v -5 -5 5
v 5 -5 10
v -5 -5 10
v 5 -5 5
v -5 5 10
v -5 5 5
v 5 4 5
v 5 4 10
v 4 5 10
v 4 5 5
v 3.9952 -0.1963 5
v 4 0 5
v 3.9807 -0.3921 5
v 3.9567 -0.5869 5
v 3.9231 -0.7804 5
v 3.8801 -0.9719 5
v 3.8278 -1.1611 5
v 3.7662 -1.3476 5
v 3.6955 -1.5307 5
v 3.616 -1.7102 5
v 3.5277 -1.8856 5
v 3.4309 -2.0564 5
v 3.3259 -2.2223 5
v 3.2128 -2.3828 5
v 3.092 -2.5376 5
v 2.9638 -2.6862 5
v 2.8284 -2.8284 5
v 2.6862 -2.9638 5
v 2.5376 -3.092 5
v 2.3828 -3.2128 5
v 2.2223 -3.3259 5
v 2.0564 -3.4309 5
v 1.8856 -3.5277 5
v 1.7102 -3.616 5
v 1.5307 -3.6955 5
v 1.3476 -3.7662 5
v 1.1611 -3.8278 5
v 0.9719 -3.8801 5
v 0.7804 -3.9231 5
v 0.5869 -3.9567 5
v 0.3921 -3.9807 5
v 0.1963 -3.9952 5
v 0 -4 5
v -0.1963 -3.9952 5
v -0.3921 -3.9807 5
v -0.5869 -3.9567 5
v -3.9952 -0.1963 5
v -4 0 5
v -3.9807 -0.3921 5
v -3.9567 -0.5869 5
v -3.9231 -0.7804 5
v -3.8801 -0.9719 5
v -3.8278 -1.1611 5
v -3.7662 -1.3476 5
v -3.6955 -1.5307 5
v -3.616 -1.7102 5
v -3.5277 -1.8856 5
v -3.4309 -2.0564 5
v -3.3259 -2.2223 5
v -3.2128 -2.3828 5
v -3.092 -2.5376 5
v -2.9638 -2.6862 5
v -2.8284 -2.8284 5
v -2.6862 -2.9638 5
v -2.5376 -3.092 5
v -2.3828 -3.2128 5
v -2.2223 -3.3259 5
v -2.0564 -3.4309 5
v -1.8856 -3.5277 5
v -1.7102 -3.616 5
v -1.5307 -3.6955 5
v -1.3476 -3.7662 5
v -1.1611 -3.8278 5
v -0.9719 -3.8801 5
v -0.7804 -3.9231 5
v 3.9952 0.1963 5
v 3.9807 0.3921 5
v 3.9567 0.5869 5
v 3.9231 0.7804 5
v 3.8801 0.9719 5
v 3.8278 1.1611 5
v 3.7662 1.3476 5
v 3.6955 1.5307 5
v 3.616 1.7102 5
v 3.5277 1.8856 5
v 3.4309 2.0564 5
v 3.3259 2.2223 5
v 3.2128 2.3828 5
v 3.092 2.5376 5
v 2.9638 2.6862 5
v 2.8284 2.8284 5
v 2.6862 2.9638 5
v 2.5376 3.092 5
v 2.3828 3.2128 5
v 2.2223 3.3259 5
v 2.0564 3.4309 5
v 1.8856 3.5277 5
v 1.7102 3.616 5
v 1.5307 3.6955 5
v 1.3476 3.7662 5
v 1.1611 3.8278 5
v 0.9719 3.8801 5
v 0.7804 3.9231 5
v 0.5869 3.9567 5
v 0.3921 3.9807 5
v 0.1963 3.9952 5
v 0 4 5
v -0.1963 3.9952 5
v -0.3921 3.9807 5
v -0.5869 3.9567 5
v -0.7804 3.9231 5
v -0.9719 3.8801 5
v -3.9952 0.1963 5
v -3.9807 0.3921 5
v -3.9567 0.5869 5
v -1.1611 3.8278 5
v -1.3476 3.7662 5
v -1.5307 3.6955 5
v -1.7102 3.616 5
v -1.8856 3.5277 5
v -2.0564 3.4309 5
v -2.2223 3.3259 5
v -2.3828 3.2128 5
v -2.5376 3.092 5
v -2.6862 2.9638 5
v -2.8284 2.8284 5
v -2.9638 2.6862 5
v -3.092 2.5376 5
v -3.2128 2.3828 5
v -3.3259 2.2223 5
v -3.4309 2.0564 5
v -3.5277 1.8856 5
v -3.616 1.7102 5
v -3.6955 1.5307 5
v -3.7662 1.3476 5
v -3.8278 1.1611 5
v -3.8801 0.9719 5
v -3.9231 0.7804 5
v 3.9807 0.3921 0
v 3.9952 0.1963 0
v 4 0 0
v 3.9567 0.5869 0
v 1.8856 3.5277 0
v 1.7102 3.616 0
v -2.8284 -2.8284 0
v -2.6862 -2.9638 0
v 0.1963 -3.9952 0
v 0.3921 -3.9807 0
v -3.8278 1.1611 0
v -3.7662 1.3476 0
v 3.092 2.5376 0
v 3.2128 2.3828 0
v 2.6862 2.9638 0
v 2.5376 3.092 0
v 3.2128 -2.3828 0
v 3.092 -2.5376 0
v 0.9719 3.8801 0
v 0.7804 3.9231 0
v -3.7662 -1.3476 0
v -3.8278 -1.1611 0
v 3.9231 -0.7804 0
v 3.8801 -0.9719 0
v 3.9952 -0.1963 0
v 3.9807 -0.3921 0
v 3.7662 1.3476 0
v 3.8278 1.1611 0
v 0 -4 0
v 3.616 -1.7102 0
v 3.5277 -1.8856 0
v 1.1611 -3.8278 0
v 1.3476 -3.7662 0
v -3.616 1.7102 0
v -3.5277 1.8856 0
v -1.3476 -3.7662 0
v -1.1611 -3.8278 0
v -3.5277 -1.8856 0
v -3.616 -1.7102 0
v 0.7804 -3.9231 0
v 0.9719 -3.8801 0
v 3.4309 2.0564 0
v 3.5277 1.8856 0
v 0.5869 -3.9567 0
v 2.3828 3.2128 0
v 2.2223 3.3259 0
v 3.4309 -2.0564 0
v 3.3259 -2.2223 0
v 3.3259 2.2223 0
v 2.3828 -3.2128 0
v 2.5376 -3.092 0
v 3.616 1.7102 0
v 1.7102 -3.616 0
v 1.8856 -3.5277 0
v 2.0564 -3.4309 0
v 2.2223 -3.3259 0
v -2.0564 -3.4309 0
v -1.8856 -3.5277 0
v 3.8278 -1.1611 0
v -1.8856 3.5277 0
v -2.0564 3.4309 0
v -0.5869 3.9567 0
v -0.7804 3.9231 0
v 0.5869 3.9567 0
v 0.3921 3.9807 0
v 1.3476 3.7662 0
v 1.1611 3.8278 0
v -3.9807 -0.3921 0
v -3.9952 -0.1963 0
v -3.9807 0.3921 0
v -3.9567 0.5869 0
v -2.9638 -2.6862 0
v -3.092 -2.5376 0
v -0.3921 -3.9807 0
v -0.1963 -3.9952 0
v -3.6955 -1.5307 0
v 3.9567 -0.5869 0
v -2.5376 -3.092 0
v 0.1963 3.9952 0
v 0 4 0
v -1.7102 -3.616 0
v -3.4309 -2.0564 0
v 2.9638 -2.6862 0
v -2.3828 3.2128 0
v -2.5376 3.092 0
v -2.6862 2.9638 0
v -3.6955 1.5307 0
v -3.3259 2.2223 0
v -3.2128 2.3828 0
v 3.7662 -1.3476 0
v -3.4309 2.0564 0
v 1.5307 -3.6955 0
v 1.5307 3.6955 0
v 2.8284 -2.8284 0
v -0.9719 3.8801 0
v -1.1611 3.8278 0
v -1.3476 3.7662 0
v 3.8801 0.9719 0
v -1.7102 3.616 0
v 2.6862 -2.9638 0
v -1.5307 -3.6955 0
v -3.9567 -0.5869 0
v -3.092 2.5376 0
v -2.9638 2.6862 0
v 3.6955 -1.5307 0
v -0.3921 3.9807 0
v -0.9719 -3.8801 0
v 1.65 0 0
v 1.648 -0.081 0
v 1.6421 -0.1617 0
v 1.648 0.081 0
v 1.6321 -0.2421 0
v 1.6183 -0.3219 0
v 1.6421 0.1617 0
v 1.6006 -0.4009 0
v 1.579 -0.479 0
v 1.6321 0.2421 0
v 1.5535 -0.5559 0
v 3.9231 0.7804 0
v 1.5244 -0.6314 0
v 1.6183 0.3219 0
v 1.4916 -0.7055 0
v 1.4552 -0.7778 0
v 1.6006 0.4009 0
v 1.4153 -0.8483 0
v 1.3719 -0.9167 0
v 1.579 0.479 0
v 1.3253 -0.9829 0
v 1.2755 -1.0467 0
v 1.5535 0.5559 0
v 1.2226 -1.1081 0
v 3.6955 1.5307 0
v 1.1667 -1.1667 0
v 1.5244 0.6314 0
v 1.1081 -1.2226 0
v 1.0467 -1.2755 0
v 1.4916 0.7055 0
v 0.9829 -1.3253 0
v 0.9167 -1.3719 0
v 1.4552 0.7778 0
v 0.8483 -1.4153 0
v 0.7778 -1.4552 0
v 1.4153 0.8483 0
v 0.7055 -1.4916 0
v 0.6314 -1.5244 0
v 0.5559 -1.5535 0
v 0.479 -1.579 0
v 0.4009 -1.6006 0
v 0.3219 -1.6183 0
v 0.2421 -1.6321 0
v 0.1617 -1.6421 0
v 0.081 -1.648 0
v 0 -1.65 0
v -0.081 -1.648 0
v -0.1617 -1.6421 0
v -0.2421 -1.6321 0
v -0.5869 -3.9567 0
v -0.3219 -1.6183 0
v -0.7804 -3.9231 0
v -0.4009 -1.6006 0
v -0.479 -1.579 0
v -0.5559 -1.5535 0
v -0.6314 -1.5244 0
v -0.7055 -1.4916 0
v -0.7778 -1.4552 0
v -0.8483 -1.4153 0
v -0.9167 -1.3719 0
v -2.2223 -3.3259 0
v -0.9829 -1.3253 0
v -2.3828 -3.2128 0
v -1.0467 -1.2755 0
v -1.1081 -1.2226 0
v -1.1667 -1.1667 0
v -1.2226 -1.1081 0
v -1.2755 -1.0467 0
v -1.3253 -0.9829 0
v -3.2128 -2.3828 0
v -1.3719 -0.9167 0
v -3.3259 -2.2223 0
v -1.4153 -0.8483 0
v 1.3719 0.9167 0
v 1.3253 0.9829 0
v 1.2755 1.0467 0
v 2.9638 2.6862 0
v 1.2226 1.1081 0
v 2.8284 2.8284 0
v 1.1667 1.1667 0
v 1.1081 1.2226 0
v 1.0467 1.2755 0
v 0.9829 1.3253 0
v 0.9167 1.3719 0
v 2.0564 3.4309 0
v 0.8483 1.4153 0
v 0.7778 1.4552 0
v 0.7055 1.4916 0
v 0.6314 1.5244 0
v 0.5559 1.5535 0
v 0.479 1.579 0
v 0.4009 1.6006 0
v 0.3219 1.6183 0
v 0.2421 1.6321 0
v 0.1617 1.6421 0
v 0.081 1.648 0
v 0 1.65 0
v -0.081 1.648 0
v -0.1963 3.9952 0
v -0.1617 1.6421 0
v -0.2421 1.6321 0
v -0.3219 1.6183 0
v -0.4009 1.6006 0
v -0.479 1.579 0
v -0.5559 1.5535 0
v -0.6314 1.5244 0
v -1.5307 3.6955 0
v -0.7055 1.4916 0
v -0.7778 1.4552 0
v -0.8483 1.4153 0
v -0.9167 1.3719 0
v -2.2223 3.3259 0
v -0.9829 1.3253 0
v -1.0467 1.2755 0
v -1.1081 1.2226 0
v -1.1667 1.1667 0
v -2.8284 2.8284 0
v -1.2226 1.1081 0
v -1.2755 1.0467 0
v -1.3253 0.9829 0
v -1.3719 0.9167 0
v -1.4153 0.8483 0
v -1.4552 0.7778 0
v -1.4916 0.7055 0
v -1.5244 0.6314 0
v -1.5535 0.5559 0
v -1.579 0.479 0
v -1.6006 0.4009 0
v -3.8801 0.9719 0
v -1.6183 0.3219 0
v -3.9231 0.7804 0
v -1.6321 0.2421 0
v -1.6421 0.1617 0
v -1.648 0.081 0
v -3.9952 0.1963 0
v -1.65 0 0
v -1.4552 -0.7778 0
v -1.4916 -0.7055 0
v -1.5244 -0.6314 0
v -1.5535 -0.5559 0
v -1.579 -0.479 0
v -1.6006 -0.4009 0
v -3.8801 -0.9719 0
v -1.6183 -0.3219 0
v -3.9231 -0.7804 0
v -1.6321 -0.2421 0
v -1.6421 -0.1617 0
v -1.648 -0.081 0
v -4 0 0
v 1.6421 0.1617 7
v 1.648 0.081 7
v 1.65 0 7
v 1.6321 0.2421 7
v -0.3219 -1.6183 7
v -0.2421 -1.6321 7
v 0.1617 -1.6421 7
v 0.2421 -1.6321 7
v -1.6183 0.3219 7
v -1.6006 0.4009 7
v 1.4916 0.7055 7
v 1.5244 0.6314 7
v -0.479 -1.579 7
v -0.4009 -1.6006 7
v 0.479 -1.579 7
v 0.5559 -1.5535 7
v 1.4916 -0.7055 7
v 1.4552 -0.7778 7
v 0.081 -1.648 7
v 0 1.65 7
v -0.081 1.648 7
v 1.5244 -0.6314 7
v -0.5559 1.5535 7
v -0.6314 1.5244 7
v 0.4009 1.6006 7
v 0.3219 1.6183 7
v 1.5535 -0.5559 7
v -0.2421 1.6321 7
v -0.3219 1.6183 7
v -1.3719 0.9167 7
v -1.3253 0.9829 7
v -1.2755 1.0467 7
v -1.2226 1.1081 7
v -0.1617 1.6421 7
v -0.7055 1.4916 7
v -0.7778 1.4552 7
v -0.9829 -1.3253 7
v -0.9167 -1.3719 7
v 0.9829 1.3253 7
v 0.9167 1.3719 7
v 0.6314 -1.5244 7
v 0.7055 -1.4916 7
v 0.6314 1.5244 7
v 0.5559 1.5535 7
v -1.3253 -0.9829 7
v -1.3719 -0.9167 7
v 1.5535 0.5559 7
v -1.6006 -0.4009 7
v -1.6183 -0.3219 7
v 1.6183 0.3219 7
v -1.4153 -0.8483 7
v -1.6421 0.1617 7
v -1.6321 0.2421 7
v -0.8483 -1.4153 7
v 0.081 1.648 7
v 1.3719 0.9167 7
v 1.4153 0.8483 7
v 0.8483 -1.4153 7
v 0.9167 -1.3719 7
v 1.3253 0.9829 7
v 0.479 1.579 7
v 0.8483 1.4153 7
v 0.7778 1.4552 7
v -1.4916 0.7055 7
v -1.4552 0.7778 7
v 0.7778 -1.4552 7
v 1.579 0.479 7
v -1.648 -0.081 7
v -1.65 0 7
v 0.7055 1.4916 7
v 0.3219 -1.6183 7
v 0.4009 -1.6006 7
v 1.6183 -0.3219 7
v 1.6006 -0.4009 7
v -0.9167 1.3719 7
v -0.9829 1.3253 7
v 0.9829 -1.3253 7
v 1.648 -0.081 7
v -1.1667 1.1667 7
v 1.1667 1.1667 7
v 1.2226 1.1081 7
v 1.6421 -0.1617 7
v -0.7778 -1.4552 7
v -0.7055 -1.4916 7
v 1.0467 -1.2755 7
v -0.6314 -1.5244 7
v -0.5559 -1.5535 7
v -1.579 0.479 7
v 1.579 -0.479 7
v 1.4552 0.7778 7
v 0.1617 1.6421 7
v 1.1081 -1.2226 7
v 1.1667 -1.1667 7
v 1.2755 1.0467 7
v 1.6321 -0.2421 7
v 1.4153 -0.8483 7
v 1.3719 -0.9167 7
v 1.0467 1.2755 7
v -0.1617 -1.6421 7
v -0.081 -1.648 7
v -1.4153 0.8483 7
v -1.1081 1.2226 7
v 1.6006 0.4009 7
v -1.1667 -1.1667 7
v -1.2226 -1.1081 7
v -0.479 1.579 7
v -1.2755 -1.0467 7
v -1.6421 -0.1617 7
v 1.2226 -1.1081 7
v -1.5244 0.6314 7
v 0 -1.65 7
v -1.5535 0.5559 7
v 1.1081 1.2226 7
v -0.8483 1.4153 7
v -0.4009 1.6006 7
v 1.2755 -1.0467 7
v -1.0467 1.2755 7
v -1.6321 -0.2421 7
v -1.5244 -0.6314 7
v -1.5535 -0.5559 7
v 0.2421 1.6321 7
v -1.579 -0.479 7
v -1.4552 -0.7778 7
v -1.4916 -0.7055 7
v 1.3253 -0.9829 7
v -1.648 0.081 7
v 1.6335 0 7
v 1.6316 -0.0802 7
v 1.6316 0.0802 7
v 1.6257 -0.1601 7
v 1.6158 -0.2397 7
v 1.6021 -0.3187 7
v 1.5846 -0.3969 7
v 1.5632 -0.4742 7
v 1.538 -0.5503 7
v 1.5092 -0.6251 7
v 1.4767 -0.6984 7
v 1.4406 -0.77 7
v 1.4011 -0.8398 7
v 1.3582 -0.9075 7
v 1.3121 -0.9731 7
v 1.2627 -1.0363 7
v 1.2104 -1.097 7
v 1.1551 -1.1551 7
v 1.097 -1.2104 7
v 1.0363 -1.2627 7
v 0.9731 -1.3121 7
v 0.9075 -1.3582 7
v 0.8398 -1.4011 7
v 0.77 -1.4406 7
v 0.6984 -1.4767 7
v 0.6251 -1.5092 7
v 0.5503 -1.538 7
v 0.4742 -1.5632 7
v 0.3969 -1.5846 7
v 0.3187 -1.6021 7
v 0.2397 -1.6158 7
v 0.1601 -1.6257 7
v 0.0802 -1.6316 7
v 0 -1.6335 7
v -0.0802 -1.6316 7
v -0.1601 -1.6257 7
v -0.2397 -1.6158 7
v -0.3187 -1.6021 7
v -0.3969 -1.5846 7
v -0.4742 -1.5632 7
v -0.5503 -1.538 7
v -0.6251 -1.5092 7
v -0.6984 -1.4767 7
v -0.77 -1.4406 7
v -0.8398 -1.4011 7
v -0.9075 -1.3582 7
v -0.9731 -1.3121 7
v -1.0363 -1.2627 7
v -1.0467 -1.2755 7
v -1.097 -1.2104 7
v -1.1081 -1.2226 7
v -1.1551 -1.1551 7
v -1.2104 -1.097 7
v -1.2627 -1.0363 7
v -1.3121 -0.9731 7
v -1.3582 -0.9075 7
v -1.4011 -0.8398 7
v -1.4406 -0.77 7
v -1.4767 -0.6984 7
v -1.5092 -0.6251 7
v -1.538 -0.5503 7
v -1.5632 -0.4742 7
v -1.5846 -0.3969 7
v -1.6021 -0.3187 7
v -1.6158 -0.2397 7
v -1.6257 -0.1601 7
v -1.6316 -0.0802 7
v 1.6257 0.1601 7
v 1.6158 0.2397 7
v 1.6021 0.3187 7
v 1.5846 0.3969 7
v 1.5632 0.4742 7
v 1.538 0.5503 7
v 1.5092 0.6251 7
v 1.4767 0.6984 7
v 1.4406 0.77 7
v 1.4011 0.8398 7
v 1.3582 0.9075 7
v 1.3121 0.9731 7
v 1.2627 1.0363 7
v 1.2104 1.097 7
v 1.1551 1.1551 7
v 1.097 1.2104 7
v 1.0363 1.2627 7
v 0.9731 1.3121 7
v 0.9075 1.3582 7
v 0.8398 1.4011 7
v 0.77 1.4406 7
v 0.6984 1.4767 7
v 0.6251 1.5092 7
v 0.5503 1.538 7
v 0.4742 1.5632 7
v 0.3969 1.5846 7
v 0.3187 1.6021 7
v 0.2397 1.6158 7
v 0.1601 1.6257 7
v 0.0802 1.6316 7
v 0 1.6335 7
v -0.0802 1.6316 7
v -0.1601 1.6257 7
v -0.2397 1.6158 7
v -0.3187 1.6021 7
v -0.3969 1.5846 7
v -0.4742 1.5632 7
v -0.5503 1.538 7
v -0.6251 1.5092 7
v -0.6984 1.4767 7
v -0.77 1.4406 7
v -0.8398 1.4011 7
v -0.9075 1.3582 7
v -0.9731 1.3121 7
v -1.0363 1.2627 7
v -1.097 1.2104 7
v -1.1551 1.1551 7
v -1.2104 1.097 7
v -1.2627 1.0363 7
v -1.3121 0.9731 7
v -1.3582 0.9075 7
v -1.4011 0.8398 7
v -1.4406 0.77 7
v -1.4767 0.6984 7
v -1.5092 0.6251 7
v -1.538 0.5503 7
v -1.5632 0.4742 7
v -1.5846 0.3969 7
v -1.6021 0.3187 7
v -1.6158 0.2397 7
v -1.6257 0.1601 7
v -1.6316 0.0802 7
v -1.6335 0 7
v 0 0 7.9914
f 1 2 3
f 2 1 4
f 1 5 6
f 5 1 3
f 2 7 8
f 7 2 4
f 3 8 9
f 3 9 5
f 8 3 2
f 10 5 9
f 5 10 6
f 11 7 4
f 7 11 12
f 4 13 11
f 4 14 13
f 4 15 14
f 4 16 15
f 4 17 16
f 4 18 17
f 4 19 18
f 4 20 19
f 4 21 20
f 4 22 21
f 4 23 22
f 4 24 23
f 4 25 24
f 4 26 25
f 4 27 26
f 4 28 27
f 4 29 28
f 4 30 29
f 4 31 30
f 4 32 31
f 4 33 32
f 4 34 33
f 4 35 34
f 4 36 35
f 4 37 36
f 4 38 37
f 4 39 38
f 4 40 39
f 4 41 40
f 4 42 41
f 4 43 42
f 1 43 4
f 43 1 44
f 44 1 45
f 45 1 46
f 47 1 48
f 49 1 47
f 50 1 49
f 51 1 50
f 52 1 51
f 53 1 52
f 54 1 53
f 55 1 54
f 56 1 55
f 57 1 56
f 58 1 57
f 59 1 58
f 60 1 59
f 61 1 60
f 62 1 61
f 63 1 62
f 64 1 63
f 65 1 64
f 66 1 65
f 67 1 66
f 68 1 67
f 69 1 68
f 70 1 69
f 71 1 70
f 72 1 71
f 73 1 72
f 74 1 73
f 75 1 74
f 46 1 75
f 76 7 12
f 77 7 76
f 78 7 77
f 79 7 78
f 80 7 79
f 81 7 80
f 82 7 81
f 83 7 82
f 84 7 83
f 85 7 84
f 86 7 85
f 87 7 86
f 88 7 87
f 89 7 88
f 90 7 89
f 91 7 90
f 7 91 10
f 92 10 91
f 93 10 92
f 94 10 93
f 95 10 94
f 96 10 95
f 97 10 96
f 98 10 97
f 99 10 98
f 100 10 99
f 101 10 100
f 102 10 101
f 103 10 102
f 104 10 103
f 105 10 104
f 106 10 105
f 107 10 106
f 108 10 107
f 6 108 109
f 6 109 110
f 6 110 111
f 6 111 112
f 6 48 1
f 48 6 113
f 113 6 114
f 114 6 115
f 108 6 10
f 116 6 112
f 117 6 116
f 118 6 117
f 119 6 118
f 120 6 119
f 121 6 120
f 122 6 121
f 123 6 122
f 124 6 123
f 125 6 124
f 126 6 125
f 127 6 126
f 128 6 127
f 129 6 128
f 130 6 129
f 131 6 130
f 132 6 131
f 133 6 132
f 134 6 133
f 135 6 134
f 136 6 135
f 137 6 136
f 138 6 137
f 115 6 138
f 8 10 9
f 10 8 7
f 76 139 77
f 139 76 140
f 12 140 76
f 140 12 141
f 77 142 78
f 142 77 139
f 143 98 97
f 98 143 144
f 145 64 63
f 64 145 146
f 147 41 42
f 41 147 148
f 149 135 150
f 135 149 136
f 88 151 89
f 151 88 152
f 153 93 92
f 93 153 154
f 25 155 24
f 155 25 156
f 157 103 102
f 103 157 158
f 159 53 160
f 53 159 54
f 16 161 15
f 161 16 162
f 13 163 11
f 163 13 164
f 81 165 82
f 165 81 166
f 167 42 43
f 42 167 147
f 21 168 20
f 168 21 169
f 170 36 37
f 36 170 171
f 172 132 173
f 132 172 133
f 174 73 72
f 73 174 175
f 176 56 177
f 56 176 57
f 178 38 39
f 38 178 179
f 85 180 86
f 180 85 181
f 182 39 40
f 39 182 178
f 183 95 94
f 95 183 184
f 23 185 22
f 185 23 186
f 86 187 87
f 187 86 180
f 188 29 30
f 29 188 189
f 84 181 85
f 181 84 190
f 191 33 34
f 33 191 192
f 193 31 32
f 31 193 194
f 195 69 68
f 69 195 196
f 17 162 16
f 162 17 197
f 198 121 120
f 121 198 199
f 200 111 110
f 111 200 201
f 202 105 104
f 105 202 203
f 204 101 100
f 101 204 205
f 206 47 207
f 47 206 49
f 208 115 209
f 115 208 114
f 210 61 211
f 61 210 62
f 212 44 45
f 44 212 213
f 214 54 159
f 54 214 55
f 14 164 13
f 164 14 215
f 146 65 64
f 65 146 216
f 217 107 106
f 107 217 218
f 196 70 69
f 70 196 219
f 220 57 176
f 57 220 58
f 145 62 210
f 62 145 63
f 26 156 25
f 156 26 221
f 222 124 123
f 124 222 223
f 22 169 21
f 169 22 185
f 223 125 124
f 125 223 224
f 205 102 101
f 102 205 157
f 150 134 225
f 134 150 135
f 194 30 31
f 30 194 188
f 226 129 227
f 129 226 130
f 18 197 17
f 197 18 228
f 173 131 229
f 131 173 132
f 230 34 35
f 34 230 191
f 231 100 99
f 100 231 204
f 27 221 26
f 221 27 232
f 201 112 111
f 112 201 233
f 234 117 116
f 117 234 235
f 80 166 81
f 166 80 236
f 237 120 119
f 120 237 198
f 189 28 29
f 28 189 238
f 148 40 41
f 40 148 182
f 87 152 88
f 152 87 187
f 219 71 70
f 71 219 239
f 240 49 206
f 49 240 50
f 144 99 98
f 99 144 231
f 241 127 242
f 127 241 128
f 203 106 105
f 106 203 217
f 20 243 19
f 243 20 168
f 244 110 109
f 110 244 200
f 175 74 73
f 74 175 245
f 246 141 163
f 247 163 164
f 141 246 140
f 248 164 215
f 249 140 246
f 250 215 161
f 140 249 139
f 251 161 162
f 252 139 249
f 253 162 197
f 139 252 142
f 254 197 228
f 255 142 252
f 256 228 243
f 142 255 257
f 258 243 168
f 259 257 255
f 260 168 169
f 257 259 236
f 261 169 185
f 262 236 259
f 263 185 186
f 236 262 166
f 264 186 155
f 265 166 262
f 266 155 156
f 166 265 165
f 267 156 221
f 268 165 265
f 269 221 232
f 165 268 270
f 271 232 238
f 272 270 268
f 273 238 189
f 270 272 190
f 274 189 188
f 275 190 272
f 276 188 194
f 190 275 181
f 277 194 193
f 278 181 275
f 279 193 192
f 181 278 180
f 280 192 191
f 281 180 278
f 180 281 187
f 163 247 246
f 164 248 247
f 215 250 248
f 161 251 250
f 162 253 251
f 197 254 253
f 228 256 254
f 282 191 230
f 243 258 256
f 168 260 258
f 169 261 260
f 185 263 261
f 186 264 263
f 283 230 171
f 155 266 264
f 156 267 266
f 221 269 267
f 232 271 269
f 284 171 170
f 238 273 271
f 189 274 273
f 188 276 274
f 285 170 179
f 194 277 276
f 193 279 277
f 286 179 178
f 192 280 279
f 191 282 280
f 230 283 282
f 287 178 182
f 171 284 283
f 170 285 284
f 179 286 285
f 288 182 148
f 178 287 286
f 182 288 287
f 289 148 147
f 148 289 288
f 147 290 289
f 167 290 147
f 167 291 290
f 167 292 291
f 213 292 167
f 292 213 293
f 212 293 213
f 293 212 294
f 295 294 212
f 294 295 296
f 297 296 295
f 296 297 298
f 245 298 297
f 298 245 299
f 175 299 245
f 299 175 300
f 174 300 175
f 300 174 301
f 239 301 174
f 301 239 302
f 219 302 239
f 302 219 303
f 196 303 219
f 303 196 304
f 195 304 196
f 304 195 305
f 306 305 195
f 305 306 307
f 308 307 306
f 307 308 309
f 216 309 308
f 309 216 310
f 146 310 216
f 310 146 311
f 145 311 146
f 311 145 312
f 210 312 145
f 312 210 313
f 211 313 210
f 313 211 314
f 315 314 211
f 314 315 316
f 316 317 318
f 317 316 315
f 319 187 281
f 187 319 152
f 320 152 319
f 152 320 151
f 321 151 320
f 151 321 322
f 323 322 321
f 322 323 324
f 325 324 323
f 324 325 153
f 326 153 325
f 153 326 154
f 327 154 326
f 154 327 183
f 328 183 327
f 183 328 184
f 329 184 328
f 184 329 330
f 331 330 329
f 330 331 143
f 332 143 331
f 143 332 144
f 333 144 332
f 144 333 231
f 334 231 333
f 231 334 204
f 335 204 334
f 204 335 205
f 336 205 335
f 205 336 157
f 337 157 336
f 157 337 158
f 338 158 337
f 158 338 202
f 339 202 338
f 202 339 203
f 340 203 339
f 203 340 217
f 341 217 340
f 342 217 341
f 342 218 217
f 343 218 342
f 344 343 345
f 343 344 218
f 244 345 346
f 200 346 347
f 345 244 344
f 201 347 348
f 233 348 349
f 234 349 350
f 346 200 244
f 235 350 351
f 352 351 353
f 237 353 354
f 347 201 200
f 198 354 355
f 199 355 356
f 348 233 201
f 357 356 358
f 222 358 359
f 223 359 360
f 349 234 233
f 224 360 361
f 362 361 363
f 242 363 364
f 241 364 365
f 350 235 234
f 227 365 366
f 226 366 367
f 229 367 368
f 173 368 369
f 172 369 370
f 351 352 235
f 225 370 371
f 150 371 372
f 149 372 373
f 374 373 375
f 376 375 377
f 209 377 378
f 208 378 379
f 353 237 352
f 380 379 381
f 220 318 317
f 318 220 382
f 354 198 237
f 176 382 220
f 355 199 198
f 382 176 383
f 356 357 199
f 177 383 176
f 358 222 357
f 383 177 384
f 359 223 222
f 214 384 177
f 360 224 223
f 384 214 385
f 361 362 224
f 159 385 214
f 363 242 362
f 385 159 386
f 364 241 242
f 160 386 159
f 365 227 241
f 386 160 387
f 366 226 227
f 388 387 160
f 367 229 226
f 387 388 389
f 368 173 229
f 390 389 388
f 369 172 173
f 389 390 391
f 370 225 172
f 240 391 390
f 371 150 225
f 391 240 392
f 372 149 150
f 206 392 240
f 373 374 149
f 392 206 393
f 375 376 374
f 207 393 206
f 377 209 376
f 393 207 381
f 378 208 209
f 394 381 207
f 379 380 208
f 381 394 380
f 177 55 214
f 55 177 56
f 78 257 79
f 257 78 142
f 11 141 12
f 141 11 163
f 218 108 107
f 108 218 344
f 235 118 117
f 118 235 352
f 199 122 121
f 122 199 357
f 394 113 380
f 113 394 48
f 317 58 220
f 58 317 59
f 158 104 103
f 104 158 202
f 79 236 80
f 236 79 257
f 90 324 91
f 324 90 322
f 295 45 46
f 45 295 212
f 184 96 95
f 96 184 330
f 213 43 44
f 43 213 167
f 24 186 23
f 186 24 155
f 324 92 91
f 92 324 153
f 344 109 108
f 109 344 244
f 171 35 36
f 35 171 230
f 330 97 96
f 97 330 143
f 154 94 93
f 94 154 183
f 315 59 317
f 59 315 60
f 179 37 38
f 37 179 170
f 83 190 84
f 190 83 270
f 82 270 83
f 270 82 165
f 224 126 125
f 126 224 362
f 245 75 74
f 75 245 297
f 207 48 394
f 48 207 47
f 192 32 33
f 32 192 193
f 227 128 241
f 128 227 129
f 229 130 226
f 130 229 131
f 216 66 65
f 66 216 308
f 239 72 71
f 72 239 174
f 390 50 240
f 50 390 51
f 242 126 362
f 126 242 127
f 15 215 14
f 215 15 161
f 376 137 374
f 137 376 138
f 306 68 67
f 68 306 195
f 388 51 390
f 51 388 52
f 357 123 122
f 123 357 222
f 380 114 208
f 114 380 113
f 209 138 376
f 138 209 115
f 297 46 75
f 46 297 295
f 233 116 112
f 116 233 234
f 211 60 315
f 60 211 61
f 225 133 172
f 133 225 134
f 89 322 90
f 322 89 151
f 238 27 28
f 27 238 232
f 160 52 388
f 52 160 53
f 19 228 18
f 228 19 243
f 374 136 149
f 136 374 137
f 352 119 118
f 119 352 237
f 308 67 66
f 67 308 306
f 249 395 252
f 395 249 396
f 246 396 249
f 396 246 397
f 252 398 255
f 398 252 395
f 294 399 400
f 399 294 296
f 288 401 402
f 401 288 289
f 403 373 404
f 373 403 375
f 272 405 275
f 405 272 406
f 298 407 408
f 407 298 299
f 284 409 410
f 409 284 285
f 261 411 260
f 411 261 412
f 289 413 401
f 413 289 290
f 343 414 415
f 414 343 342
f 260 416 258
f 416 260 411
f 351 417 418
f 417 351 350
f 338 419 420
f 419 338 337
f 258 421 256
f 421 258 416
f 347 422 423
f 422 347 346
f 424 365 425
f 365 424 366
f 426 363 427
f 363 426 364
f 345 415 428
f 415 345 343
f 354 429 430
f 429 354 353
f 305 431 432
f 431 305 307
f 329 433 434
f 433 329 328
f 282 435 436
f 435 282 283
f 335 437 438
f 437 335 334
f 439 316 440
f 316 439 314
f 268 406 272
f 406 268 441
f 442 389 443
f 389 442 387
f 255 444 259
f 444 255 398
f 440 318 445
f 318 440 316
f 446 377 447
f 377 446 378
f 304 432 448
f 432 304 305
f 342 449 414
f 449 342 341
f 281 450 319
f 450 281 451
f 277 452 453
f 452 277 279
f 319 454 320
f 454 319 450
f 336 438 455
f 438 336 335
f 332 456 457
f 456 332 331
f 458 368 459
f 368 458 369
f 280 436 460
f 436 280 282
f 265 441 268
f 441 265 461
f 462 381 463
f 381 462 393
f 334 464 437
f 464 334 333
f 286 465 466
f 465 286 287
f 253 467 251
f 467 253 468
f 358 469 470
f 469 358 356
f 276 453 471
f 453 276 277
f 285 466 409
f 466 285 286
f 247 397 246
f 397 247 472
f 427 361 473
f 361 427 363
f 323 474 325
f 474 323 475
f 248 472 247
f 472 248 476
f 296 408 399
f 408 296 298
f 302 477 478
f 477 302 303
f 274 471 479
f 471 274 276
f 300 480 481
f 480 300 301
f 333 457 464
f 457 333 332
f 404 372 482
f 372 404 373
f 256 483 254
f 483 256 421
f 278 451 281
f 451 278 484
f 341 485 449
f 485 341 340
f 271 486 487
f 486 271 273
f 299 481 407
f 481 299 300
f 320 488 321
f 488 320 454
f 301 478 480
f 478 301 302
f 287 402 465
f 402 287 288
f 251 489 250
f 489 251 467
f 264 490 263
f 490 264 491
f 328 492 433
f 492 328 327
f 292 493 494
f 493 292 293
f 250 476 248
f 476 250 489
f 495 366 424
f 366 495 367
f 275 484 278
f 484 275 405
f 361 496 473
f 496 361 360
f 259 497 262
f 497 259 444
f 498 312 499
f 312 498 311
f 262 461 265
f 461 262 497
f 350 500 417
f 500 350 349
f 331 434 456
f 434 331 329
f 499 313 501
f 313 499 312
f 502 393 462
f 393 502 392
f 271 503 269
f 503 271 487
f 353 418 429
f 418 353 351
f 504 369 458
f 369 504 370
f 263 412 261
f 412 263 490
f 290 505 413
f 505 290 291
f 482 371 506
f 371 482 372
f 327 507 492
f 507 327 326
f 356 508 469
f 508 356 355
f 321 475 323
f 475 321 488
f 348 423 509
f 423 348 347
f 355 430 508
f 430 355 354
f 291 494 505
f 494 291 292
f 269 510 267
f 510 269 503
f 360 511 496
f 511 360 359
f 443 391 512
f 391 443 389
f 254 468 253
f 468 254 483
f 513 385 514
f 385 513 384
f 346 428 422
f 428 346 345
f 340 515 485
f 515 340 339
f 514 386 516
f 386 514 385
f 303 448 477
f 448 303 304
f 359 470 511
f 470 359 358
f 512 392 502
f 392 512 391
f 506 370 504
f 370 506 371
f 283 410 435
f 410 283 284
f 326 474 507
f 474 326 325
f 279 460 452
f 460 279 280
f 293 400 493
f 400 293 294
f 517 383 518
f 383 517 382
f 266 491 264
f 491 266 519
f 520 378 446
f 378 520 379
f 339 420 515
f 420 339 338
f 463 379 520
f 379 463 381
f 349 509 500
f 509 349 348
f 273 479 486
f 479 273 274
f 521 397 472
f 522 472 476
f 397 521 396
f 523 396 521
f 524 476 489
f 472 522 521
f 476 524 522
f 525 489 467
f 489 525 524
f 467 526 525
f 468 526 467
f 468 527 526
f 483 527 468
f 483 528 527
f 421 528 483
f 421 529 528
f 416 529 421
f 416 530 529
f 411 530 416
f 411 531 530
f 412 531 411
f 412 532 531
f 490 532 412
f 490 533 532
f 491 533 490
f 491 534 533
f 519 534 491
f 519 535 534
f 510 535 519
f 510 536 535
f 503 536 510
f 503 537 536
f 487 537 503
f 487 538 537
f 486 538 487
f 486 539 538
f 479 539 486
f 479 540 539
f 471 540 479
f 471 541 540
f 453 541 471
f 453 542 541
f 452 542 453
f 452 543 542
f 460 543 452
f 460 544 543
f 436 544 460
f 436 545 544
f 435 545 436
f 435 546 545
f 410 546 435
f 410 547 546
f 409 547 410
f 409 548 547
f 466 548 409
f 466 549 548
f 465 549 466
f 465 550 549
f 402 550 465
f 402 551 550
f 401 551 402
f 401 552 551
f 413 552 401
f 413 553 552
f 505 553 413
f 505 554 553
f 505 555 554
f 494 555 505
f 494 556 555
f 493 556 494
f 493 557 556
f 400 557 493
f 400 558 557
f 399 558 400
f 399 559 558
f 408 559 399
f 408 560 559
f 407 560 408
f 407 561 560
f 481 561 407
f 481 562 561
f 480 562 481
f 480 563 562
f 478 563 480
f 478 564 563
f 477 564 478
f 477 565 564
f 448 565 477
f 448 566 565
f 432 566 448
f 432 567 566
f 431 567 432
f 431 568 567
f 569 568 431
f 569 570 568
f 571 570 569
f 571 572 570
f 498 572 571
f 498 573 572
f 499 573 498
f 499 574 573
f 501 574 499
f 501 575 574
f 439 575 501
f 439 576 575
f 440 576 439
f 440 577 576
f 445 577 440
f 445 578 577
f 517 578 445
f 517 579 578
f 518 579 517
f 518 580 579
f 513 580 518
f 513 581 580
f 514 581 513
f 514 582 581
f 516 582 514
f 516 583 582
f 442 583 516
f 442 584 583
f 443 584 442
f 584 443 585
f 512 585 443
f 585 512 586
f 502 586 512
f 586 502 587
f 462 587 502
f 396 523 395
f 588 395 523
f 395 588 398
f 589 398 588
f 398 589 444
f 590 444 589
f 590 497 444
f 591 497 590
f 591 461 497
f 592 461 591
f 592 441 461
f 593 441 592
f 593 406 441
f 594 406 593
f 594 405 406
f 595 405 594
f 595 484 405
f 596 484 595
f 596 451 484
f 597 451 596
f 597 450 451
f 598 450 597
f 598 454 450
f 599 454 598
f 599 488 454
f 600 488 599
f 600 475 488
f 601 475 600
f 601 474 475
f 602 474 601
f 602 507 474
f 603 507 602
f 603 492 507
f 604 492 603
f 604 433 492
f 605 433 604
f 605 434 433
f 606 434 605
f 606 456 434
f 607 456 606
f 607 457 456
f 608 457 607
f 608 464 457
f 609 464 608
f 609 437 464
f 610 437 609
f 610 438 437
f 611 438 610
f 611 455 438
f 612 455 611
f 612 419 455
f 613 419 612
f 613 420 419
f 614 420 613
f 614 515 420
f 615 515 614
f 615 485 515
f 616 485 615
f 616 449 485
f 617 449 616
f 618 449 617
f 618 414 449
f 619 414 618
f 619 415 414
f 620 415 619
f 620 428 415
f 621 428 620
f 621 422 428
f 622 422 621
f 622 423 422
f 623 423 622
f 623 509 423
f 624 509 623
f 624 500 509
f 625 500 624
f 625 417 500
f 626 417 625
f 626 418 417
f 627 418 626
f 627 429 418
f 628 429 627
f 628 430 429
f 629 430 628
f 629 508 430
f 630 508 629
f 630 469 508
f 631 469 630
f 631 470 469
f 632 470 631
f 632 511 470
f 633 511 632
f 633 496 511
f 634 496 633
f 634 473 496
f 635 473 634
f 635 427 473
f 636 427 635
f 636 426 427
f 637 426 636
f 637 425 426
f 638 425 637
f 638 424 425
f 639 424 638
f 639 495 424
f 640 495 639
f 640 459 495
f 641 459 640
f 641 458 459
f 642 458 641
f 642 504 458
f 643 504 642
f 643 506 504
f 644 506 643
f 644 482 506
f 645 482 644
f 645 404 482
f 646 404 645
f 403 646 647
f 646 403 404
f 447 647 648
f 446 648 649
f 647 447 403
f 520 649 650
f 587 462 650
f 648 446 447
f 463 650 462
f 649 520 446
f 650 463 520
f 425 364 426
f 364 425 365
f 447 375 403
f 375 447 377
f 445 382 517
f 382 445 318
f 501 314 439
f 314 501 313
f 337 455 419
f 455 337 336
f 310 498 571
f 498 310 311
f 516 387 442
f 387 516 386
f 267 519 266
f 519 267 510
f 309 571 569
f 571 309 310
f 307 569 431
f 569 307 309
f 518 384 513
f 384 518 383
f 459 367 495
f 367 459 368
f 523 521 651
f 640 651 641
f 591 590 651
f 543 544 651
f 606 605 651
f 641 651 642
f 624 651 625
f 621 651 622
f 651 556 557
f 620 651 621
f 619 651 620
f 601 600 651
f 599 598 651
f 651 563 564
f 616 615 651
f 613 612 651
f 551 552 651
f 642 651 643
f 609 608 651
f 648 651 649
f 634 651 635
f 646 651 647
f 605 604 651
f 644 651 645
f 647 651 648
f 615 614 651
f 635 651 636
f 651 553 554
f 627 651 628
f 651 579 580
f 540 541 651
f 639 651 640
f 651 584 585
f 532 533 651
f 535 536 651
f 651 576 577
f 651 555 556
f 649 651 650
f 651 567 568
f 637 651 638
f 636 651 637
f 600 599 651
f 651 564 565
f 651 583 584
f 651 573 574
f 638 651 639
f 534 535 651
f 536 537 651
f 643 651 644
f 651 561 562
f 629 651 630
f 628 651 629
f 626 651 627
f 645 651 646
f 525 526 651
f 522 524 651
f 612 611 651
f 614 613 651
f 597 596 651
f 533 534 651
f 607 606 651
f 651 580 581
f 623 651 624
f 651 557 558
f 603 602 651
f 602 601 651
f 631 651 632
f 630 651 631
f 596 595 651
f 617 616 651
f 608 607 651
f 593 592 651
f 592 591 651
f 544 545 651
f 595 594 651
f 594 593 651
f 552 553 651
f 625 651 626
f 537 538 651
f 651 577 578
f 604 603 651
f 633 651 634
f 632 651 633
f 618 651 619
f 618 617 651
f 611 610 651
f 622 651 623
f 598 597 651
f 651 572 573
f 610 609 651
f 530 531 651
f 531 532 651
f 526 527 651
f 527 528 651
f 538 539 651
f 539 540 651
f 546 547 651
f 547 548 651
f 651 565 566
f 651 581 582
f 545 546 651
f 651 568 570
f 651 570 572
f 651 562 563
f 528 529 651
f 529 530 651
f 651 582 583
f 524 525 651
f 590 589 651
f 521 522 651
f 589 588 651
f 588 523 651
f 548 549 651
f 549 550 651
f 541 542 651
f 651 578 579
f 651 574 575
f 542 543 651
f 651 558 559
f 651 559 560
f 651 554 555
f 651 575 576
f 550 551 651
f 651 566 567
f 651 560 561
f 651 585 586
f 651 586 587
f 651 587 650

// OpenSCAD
// file: logo_stampV1.scad
// Copyright (C) 2026 Jonas Immanuel Frey - Licensed under GPL. See LICENSE file for details
// Logo branding stamp V1: a brass stamp that screws onto a temperature
// controlled soldering iron, like a tip for heat-set inserts, and presses the
// logo into FDM prints (PLA, PETG). Made for CNC milling at JLCCNC.
//
// The logo comes from a DXF and stands logo_relief proud of the stamp face,
// mirrored, so its impression reads the right way round. A square head carries
// it; a round neck on the back holds the mount: a blind hole for a thread
// (the stamp screws onto a male stud) or a bore with a set screw (the stamp
// slips over a plain round tip).
//
// The thread is not modelled: the hole has the tap drill's diameter, and the
// thread goes into the order as a note, as JLCCNC asks for.
//
// logo_stampV1_TraceTrove.scad is this file with the TraceTrove logo.
// build.py writes the DXFs, the STEP file and the checks.
//
// Origin: on the axis, at the neck's end face. The logo points to +z.
// Units: mm. No external libraries needed.

/* [Logo] */
// Lines and arcs only, closed contours, no doubled entities (build.py dxf).
logo_dxf = "veryos_logo.dxf";
// Size and centre of the logo in the DXF, from build.py analyze.
logo_dxf_size = [43.9095, 31.2528];
logo_dxf_center = [0, 0];
// The height follows from the DXF's proportions.
logo_width = 8;
// How far the logo stands above the stamp face.
logo_relief = 0.4;
// Least distance from the logo to the head's edges.
logo_edge_clearance = 1;
// Inner corners of the logo get this radius, the radius of the end mill that
// cuts them; gaps narrower than twice the radius stay closed. 0 = as drawn.
logo_inner_radius = 0.25;
// true for the stamp; false shows the logo as the impression will read.
logo_mirror = true;

/* [Head] */
head_width = 10;
head_depth = 10;
head_thickness = 5;
// One corner of the head is cut off, to tell where the logo's top is without
// looking at the face: it is the impression's top left corner. 0 = none.
orientation_chamfer = 1;

/* [Mount] */
// thread: blind hole for a thread, the stamp screws onto a male stud.
// bore: plain bore, the stamp slips over a round tip.
mount = "thread"; // [thread, bore]
// Round neck on the back of the head. 0 = the hole is in the head only.
neck_length = 5;
// Wall around the hole; the neck is as thick as the hole plus two walls.
neck_wall = 2;

/* [Mount: thread] */
// M4 x 0.7, as chosen for the iron's stud. M5 is 5 and 0.8.
thread_diameter = 4;
thread_pitch = 0.7;
// Depth of the full thread. Not less than the stud is long.
thread_depth = 5;

/* [Mount: bore] */
// Diameter of the tip the stamp slips over. Placeholder: measure the tip.
bore_diameter = 6;
// Added to the bore's diameter.
bore_clearance = 0.05;
bore_depth = 8;
// Thread of the set screw in the neck's side, M3 x 0.5. 0 = no set screw.
set_screw_diameter = 3;
set_screw_pitch = 0.5;

/* [Quality] */
$fn = 128;

/* [Hidden] */
eps = 0.01;
logo_scale = logo_width / logo_dxf_size[0];
logo_height = logo_dxf_size[1] * logo_scale;
// The hole as it is machined: a tap drill is the thread's diameter less its
// pitch (3.3 for M4, 4.2 for M5).
hole_nominal = mount == "thread" ? thread_diameter : bore_diameter;
hole_diameter = mount == "thread" ? thread_diameter - thread_pitch : bore_diameter + bore_clearance;
// A blind thread ends half a diameter above the hole's bottom (JLCCNC's
// threaded hole guideline). The drill's 118 degree point comes below that.
thread_runout = thread_diameter / 2;
hole_depth = mount == "thread" ? thread_depth + thread_runout : bore_depth;
hole_point = mount == "thread" ? hole_diameter / 2 / tan(59) : 0;
neck_diameter = hole_nominal + 2 * neck_wall;
face_z = neck_length + head_thickness;
// Solid brass between the hole and the stamp face.
floor_thickness = face_z - hole_depth - hole_point;

assert(logo_width + 2 * logo_edge_clearance <= head_width + eps
       && logo_height + 2 * logo_edge_clearance <= head_depth + eps,
       "The logo is closer to the head's edge than logo_edge_clearance; lower logo_width or enlarge the head.");
assert(neck_length == 0 || neck_diameter <= min(head_width, head_depth),
       "The neck is thicker than the head; lower neck_wall.");
assert(floor_thickness >= 1,
       "Less than 1 mm of brass between the hole and the stamp face; lengthen the neck or shorten the hole.");
assert(mount != "thread" || thread_depth <= 3 * thread_diameter,
       "JLCCNC taps a thread at most three diameters deep.");
assert(mount != "bore" || set_screw_diameter == 0 || neck_length >= set_screw_diameter + 2,
       "The neck is too short for the set screw.");

// The logo as it lies on the stamp face: centred, logo_width wide, mirrored.
module logo_2d() {
    offset(r = -logo_inner_radius) offset(r = logo_inner_radius)
        scale([logo_mirror ? -logo_scale : logo_scale, logo_scale])
            translate(-logo_dxf_center) import(logo_dxf);
}

module logo() {
    translate([0, 0, face_z - eps]) linear_extrude(logo_relief + eps) logo_2d();
}

// Head and neck. The cut corner is at the impression's top left, which is
// the top right when looking at the mirrored logo.
module stamp_body() {
    side = logo_mirror ? 1 : -1;
    translate([0, 0, neck_length]) linear_extrude(head_thickness) difference() {
        square([head_width, head_depth], center = true);
        translate([side * head_width / 2, head_depth / 2]) rotate(45)
            square(orientation_chamfer * sqrt(2), center = true);
    }
    if (neck_length > 0) cylinder(d = neck_diameter, h = neck_length + eps);
}

// What the mount removes: the hole from the neck's end, and for the bore the
// set screw's tap hole through the neck's wall, halfway along the neck.
module mount_cut() {
    translate([0, 0, -eps]) cylinder(d = hole_diameter, h = hole_depth + eps);
    if (hole_point > 0)
        translate([0, 0, hole_depth - eps]) cylinder(d1 = hole_diameter, d2 = 0, h = hole_point + eps);
    if (mount == "bore" && set_screw_diameter > 0)
        translate([0, 0, neck_length / 2]) rotate([-90, 0, 0])
            cylinder(d = set_screw_diameter - set_screw_pitch, h = max(head_width, head_depth));
}

// The colours only tell the logo from the stamp face in the preview.
module stamp() {
    difference() {
        union() {
            color("goldenrod") stamp_body();
            color("saddlebrown") logo();
        }
        color("goldenrod") mount_cut();
    }
}

stamp();
// main file
// Copyright (C) 2026 Jonas Immanuel Frey - Licensed under GPL. See LICENSE file for details
// TraceTrove version of logo_stampV1.scad: the flat TraceTrove logo V3 instead
// of the VeryOS logo. Everything else is logo_stampV1.scad, which this file
// includes; the values below replace its values.

include <logo_stampV1.scad>

/* [Logo] */
// region2d() of tracetrove_logo.scad as lines and arcs (build.py dxf).
logo_dxf = "tracetrove_logo.dxf";
logo_dxf_size = [20, 31.7543];
logo_dxf_center = [7.5, 0];
// 7.94 high.
logo_width = 5;
